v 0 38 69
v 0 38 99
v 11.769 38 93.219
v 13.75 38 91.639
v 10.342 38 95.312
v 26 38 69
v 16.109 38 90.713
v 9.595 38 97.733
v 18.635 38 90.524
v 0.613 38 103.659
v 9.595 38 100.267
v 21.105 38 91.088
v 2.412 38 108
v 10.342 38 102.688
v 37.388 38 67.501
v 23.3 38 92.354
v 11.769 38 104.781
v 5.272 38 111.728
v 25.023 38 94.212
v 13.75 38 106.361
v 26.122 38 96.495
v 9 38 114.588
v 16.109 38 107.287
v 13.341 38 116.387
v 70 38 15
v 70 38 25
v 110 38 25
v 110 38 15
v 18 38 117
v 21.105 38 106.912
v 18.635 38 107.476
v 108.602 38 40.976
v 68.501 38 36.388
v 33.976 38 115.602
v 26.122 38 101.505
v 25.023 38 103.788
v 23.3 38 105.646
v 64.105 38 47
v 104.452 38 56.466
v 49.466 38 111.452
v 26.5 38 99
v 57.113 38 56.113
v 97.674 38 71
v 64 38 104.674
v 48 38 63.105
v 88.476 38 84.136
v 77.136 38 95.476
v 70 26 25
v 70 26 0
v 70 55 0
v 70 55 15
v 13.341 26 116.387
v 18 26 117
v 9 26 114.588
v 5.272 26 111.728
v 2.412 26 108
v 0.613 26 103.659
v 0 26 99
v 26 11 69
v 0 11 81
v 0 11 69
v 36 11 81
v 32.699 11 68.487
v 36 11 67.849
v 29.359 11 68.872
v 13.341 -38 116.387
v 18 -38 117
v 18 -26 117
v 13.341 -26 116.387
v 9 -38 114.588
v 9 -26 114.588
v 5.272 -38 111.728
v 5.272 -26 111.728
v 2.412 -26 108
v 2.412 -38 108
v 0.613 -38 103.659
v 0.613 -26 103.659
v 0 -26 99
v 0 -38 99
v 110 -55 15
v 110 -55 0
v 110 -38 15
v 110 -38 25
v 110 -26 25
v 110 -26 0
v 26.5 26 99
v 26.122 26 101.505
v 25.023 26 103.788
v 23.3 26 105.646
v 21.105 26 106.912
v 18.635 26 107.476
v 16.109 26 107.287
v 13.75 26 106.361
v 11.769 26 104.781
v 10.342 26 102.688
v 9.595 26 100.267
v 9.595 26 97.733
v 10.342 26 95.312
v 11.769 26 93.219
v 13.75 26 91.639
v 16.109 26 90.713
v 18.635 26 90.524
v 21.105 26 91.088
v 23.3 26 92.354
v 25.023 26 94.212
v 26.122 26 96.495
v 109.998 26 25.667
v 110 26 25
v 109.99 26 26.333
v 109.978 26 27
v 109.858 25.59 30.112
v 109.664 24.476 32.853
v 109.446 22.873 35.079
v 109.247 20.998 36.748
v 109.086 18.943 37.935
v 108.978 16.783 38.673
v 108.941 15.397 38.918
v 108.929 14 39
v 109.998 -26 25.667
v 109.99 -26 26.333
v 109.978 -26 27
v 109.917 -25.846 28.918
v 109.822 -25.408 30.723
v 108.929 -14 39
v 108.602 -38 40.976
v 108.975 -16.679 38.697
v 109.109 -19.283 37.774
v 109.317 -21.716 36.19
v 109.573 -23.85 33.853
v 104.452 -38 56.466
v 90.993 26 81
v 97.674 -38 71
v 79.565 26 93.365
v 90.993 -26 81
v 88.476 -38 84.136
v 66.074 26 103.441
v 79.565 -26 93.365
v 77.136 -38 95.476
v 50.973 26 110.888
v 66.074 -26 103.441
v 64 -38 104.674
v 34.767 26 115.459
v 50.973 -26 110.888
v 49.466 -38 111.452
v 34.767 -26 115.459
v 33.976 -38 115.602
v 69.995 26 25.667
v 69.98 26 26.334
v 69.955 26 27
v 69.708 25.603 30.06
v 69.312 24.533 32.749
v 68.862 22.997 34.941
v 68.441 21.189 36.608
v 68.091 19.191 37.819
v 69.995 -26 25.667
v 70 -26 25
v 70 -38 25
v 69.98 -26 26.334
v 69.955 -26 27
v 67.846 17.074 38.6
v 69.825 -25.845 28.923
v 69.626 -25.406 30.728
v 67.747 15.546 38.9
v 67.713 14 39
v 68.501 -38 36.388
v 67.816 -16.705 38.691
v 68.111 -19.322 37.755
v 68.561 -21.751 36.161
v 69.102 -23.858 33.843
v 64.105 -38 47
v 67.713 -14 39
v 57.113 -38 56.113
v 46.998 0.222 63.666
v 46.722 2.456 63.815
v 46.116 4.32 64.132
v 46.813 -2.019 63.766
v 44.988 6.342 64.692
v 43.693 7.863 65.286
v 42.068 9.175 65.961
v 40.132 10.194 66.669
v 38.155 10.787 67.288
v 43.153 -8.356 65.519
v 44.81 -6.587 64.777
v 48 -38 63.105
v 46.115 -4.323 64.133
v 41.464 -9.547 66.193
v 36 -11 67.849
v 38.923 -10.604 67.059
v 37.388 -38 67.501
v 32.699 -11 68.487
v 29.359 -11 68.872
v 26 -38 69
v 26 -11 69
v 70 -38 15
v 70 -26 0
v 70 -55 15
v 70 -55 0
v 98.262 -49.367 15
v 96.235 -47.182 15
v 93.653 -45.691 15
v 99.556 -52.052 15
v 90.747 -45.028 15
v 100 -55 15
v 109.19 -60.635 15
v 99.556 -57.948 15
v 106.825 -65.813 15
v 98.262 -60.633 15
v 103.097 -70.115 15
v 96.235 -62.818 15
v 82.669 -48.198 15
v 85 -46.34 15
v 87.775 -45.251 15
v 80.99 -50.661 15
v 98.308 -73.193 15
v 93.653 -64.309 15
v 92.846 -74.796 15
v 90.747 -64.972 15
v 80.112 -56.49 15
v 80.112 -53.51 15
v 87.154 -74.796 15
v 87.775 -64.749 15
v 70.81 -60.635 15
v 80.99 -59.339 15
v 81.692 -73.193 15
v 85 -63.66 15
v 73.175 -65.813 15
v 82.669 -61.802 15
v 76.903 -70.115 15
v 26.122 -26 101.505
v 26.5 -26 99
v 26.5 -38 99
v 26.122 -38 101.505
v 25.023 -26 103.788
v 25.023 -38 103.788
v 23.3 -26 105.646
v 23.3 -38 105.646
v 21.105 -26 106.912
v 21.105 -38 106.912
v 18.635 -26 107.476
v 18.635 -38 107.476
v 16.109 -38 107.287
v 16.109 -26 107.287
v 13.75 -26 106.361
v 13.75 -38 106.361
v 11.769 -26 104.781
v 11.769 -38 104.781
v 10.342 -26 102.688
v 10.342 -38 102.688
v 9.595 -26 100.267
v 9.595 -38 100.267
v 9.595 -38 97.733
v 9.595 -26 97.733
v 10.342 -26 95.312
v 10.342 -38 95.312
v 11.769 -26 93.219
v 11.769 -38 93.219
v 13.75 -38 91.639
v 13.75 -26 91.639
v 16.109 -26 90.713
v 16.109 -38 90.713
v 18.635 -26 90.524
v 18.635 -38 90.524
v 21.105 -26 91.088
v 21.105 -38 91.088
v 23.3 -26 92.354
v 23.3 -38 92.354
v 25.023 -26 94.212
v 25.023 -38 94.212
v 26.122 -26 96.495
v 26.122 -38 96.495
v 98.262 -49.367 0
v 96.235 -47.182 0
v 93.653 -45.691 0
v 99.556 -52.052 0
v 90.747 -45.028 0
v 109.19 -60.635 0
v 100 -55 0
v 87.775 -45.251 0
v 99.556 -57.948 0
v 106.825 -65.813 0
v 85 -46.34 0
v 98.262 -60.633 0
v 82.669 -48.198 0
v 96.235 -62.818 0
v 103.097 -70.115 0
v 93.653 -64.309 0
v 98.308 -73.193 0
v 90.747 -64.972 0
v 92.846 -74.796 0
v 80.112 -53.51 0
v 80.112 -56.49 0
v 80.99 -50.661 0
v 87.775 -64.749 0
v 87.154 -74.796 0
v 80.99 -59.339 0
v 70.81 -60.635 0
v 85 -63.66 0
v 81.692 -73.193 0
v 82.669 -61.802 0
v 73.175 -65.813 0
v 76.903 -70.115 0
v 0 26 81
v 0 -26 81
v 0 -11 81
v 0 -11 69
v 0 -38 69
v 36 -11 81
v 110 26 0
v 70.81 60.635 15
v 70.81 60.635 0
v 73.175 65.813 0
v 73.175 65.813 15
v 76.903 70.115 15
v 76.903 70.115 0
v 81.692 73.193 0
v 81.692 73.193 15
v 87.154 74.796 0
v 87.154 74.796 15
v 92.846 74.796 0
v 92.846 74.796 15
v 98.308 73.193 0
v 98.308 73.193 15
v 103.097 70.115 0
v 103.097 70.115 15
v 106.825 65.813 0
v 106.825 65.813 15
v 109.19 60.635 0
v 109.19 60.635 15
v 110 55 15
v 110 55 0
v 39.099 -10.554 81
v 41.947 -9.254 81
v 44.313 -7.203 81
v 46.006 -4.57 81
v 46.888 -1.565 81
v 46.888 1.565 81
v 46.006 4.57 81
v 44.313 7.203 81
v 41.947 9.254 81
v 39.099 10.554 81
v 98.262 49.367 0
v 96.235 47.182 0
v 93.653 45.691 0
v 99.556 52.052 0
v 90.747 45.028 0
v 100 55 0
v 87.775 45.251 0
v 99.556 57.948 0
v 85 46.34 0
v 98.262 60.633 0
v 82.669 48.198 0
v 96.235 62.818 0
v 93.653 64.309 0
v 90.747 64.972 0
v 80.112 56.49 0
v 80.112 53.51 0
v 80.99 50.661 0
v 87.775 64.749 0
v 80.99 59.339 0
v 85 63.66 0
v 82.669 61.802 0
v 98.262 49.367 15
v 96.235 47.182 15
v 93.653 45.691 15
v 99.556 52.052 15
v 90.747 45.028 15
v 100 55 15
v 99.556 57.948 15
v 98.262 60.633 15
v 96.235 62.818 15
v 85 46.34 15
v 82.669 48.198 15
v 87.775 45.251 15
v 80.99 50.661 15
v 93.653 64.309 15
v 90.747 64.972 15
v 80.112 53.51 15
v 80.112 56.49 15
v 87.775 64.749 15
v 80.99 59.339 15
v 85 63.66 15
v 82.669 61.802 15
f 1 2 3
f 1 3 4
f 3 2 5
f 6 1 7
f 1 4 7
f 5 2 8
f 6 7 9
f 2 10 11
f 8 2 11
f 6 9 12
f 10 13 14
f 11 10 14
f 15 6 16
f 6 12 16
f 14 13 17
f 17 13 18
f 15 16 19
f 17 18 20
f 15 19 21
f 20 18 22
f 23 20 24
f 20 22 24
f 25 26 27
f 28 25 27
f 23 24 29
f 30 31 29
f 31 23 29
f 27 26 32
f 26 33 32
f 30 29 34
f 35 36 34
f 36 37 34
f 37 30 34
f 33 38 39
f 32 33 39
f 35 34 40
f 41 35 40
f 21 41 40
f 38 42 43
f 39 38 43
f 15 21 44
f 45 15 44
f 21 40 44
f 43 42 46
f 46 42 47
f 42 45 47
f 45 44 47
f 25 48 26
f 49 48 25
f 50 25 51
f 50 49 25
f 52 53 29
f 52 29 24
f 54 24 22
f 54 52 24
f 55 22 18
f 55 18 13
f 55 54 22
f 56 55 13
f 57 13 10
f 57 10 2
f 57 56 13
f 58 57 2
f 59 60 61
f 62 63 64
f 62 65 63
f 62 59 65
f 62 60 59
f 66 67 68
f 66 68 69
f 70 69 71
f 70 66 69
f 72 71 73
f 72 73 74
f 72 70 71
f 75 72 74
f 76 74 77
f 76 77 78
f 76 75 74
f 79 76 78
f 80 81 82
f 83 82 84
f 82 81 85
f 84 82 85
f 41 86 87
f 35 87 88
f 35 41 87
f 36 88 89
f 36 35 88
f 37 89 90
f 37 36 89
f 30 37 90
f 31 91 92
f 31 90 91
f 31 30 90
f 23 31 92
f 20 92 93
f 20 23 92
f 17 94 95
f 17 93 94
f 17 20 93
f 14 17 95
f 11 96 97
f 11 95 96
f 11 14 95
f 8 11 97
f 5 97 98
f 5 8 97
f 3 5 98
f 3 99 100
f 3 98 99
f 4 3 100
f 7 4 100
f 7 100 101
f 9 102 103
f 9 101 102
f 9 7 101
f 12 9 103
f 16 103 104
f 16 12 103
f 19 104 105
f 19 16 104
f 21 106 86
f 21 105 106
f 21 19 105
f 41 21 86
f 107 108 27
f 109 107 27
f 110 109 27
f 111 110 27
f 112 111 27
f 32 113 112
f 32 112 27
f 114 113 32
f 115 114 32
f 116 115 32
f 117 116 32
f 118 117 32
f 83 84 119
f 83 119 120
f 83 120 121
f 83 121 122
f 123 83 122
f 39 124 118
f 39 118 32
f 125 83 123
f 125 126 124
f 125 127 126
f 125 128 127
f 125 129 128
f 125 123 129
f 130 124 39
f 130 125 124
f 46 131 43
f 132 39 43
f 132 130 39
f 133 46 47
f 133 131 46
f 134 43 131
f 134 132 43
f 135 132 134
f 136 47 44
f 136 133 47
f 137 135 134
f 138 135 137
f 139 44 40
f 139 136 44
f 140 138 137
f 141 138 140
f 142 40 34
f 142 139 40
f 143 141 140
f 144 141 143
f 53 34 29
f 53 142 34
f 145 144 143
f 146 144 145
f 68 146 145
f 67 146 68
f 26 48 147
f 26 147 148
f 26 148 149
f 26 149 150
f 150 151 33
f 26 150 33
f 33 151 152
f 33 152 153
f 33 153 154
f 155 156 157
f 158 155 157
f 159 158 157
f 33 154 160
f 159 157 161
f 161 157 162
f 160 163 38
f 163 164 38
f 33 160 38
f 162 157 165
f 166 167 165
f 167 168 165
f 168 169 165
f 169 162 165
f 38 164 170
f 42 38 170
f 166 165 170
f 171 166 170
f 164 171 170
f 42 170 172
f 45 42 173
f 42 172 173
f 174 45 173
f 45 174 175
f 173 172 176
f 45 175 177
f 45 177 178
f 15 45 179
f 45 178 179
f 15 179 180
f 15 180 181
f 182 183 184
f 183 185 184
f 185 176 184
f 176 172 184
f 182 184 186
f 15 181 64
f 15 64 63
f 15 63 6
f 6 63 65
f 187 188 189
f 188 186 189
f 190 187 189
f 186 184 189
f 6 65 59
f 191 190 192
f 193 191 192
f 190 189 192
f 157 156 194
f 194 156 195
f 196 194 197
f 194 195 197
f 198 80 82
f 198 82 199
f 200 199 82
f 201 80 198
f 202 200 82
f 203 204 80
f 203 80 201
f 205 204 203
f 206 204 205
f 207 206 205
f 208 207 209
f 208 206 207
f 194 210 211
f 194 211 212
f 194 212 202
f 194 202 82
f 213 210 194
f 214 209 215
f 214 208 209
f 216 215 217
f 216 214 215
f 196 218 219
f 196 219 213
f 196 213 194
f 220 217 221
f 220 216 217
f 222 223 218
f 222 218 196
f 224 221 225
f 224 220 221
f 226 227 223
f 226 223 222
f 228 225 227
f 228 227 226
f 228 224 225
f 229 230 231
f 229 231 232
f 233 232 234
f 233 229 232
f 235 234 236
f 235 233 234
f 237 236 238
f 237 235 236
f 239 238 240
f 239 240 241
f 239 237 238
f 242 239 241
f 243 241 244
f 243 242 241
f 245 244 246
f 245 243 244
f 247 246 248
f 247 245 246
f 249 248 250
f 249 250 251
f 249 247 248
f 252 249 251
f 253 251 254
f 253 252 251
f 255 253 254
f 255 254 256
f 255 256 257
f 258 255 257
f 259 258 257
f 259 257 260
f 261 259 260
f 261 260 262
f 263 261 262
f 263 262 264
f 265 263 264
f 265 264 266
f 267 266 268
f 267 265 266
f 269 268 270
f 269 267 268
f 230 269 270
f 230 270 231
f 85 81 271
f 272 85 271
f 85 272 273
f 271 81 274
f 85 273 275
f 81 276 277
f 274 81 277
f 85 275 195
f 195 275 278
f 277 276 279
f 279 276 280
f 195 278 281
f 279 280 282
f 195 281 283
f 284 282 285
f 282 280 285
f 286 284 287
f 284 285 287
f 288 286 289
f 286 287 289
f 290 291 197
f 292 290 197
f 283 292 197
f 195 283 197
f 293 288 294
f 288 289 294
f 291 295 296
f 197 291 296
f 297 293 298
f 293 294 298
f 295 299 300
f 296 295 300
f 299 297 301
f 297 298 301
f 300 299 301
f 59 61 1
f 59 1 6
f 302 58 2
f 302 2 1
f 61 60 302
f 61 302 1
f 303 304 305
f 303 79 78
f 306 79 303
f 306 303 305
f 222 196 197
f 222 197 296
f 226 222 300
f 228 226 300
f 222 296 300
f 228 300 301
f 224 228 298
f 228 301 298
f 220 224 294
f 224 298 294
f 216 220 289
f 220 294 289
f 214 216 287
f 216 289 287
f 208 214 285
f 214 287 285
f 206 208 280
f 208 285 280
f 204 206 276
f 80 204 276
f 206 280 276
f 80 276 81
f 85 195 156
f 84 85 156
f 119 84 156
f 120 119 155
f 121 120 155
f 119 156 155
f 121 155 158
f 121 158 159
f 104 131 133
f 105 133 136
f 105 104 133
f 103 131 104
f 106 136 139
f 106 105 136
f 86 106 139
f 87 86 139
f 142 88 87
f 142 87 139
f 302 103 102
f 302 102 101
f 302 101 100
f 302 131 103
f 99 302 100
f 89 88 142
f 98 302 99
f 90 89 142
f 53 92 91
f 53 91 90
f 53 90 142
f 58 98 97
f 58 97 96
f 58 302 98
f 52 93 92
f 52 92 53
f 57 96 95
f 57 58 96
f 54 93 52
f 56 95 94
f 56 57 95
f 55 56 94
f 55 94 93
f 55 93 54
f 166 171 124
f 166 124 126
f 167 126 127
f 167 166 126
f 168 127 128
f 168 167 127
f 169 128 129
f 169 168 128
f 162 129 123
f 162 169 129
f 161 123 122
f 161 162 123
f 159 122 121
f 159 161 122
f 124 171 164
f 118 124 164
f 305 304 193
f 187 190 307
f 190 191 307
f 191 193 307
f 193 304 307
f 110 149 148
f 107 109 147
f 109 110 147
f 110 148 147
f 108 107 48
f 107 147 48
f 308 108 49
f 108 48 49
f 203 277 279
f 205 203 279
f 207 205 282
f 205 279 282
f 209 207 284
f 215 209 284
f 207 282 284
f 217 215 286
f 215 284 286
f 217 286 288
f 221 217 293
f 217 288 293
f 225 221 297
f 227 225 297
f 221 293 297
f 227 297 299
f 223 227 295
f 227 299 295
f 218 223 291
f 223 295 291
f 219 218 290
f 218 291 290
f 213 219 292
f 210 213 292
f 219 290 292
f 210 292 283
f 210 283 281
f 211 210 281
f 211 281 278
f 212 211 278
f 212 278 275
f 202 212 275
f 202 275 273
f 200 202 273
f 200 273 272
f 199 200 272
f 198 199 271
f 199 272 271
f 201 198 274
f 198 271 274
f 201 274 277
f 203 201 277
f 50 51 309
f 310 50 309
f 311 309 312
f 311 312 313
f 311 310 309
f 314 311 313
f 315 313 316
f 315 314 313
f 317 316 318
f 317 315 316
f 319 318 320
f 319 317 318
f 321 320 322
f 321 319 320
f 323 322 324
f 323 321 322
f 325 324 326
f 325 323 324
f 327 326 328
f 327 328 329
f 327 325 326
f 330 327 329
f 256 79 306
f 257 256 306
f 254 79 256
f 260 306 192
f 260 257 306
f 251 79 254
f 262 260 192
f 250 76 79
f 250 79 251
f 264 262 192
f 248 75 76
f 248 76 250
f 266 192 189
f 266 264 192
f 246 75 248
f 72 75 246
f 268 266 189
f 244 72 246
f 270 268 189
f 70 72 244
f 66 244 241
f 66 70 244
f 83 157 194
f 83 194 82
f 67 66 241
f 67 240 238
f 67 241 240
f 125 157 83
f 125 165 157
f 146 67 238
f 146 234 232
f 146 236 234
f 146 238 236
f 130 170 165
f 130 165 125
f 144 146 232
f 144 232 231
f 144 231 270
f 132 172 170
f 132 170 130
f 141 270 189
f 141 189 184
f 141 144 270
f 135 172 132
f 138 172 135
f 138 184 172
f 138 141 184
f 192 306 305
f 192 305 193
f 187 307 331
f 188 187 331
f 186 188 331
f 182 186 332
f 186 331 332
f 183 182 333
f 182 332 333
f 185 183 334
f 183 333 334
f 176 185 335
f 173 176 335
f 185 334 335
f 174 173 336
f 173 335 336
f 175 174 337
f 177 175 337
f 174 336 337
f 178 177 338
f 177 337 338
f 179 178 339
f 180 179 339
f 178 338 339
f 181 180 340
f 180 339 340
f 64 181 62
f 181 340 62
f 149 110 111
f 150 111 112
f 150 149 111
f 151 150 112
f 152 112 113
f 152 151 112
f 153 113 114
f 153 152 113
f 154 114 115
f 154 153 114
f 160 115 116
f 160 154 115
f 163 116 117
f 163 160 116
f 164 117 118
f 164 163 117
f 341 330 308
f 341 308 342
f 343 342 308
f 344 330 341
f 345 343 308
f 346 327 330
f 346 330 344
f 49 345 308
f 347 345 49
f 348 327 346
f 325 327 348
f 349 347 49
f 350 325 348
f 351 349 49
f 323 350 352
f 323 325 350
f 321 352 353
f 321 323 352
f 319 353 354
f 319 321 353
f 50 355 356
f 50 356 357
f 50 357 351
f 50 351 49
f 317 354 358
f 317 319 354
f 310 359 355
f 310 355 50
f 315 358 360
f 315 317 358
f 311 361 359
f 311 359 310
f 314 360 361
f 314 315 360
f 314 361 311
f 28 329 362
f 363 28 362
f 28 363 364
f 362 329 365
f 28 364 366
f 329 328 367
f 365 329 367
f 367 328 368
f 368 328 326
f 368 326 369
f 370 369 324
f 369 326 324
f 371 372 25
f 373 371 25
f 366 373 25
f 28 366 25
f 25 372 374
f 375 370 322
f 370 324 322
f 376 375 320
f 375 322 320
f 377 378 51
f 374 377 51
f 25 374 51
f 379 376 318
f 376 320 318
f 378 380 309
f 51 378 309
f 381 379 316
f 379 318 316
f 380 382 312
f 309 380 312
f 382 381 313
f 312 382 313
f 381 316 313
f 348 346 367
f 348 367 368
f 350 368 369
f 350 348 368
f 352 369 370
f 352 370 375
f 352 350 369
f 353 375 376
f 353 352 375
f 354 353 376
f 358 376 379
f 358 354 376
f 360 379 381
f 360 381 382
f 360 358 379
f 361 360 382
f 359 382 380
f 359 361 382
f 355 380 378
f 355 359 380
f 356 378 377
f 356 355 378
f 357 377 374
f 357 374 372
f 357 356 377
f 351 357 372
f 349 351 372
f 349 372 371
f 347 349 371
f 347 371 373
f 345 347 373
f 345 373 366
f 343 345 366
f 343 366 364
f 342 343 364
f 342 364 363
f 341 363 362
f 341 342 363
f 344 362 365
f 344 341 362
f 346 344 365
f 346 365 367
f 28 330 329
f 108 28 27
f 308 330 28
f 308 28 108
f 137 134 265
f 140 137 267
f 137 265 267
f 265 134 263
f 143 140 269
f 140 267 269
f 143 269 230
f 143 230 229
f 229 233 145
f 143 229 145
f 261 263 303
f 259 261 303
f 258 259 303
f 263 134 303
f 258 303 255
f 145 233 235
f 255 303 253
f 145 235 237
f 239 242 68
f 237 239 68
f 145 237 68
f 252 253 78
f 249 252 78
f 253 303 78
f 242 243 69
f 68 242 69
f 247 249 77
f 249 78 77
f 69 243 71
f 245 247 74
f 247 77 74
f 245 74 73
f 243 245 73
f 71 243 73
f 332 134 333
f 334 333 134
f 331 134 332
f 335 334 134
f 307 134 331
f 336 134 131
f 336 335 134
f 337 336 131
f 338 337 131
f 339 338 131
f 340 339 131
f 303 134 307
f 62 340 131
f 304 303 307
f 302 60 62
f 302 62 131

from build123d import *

# Parameters (mm, degrees)
SKETCH_R          = 8.5
PAD_DEPTH         = 38
SKETCH001_W       = 52
SKETCH001_H       = 36
POCKET_DEPTH      = 0.001
POCKET_DEPTH_BACK = 110.001
POCKET001_DEPTH   = 81.001
SKETCH003_R       = 10
PAD001_DEPTH      = 15


with BuildPart() as part:
    # Sketch (on XZ_Plane of Origin) → Pad (new body, symmetric)
    with BuildSketch(Plane.XZ):
        with BuildLine():
            Line((70, 0), (110, 0))
            Line((110, 0), (110, 25))
            ThreePointArc((110, 25), (83.053824, 90.053824), (18, 117))
            ThreePointArc((18, 117), (5.272078, 111.727922), (0, 99))
            Line((0, 99), (0, 69))
            Line((0, 69), (26, 69))
            ThreePointArc((70, 25), (57.112698, 56.112698), (26, 69))
            Line((70, 25), (70, 0))
        make_face()
        with Locations((18, 99)):
            Circle(SKETCH_R, mode=Mode.SUBTRACT)
    extrude(amount=PAD_DEPTH, both=True)

    # Sketch001 (on YZ_Plane of Origin) → Pocket (cut, two sides)
    with BuildSketch(Plane.YZ) as pocket_sk:
        with BuildLine():
            Line((-26, 0), (-26, 27))
            ThreePointArc((-14, 39), (-22.485281, 35.485281), (-26, 27))
            Line((-14, 39), (14, 39))
            ThreePointArc((26, 27), (22.485281, 35.485281), (14, 39))
            Line((26, 27), (26, 0))
            Line((26, 0), (-26, 0))
        make_face()
        with Locations((0, 99)):
            Rectangle(SKETCH001_W, SKETCH001_H)
    extrude(amount=-POCKET_DEPTH, mode=Mode.SUBTRACT)
    extrude(pocket_sk.sketch, amount=POCKET_DEPTH_BACK, mode=Mode.SUBTRACT)

    # Sketch002 (on Face14 of Pocket) → Pocket001 (cut, through all)
    with BuildSketch(Plane.XY.offset(81)):
        with BuildLine():
            ThreePointArc((0, 11), (-11, 0), (0, -11))
            Line((0, -11), (36, -11))
            ThreePointArc((36, -11), (47, 0), (36, 11))
            Line((0, 11), (36, 11))
        make_face()
    extrude(amount=-POCKET001_DEPTH, mode=Mode.SUBTRACT)

    # Sketch003 (on XY_Plane of Origin) → Pad001 (join)
    with BuildSketch(Plane.XY):
        with BuildLine():
            Line((70, 38), (70, 55))
            ThreePointArc((70, 55), (90, 75), (110, 55))
            Line((110, 55), (110, 38))
            Line((110, 38), (70, 38))
        make_face()
        with Locations((90, 55)):
            Circle(SKETCH003_R, mode=Mode.SUBTRACT)
    pad001 = extrude(amount=PAD001_DEPTH)

    # Mirrored: Pad001 across XZ
    add(pad001.mirror(Plane.XZ))


solid = part.part
